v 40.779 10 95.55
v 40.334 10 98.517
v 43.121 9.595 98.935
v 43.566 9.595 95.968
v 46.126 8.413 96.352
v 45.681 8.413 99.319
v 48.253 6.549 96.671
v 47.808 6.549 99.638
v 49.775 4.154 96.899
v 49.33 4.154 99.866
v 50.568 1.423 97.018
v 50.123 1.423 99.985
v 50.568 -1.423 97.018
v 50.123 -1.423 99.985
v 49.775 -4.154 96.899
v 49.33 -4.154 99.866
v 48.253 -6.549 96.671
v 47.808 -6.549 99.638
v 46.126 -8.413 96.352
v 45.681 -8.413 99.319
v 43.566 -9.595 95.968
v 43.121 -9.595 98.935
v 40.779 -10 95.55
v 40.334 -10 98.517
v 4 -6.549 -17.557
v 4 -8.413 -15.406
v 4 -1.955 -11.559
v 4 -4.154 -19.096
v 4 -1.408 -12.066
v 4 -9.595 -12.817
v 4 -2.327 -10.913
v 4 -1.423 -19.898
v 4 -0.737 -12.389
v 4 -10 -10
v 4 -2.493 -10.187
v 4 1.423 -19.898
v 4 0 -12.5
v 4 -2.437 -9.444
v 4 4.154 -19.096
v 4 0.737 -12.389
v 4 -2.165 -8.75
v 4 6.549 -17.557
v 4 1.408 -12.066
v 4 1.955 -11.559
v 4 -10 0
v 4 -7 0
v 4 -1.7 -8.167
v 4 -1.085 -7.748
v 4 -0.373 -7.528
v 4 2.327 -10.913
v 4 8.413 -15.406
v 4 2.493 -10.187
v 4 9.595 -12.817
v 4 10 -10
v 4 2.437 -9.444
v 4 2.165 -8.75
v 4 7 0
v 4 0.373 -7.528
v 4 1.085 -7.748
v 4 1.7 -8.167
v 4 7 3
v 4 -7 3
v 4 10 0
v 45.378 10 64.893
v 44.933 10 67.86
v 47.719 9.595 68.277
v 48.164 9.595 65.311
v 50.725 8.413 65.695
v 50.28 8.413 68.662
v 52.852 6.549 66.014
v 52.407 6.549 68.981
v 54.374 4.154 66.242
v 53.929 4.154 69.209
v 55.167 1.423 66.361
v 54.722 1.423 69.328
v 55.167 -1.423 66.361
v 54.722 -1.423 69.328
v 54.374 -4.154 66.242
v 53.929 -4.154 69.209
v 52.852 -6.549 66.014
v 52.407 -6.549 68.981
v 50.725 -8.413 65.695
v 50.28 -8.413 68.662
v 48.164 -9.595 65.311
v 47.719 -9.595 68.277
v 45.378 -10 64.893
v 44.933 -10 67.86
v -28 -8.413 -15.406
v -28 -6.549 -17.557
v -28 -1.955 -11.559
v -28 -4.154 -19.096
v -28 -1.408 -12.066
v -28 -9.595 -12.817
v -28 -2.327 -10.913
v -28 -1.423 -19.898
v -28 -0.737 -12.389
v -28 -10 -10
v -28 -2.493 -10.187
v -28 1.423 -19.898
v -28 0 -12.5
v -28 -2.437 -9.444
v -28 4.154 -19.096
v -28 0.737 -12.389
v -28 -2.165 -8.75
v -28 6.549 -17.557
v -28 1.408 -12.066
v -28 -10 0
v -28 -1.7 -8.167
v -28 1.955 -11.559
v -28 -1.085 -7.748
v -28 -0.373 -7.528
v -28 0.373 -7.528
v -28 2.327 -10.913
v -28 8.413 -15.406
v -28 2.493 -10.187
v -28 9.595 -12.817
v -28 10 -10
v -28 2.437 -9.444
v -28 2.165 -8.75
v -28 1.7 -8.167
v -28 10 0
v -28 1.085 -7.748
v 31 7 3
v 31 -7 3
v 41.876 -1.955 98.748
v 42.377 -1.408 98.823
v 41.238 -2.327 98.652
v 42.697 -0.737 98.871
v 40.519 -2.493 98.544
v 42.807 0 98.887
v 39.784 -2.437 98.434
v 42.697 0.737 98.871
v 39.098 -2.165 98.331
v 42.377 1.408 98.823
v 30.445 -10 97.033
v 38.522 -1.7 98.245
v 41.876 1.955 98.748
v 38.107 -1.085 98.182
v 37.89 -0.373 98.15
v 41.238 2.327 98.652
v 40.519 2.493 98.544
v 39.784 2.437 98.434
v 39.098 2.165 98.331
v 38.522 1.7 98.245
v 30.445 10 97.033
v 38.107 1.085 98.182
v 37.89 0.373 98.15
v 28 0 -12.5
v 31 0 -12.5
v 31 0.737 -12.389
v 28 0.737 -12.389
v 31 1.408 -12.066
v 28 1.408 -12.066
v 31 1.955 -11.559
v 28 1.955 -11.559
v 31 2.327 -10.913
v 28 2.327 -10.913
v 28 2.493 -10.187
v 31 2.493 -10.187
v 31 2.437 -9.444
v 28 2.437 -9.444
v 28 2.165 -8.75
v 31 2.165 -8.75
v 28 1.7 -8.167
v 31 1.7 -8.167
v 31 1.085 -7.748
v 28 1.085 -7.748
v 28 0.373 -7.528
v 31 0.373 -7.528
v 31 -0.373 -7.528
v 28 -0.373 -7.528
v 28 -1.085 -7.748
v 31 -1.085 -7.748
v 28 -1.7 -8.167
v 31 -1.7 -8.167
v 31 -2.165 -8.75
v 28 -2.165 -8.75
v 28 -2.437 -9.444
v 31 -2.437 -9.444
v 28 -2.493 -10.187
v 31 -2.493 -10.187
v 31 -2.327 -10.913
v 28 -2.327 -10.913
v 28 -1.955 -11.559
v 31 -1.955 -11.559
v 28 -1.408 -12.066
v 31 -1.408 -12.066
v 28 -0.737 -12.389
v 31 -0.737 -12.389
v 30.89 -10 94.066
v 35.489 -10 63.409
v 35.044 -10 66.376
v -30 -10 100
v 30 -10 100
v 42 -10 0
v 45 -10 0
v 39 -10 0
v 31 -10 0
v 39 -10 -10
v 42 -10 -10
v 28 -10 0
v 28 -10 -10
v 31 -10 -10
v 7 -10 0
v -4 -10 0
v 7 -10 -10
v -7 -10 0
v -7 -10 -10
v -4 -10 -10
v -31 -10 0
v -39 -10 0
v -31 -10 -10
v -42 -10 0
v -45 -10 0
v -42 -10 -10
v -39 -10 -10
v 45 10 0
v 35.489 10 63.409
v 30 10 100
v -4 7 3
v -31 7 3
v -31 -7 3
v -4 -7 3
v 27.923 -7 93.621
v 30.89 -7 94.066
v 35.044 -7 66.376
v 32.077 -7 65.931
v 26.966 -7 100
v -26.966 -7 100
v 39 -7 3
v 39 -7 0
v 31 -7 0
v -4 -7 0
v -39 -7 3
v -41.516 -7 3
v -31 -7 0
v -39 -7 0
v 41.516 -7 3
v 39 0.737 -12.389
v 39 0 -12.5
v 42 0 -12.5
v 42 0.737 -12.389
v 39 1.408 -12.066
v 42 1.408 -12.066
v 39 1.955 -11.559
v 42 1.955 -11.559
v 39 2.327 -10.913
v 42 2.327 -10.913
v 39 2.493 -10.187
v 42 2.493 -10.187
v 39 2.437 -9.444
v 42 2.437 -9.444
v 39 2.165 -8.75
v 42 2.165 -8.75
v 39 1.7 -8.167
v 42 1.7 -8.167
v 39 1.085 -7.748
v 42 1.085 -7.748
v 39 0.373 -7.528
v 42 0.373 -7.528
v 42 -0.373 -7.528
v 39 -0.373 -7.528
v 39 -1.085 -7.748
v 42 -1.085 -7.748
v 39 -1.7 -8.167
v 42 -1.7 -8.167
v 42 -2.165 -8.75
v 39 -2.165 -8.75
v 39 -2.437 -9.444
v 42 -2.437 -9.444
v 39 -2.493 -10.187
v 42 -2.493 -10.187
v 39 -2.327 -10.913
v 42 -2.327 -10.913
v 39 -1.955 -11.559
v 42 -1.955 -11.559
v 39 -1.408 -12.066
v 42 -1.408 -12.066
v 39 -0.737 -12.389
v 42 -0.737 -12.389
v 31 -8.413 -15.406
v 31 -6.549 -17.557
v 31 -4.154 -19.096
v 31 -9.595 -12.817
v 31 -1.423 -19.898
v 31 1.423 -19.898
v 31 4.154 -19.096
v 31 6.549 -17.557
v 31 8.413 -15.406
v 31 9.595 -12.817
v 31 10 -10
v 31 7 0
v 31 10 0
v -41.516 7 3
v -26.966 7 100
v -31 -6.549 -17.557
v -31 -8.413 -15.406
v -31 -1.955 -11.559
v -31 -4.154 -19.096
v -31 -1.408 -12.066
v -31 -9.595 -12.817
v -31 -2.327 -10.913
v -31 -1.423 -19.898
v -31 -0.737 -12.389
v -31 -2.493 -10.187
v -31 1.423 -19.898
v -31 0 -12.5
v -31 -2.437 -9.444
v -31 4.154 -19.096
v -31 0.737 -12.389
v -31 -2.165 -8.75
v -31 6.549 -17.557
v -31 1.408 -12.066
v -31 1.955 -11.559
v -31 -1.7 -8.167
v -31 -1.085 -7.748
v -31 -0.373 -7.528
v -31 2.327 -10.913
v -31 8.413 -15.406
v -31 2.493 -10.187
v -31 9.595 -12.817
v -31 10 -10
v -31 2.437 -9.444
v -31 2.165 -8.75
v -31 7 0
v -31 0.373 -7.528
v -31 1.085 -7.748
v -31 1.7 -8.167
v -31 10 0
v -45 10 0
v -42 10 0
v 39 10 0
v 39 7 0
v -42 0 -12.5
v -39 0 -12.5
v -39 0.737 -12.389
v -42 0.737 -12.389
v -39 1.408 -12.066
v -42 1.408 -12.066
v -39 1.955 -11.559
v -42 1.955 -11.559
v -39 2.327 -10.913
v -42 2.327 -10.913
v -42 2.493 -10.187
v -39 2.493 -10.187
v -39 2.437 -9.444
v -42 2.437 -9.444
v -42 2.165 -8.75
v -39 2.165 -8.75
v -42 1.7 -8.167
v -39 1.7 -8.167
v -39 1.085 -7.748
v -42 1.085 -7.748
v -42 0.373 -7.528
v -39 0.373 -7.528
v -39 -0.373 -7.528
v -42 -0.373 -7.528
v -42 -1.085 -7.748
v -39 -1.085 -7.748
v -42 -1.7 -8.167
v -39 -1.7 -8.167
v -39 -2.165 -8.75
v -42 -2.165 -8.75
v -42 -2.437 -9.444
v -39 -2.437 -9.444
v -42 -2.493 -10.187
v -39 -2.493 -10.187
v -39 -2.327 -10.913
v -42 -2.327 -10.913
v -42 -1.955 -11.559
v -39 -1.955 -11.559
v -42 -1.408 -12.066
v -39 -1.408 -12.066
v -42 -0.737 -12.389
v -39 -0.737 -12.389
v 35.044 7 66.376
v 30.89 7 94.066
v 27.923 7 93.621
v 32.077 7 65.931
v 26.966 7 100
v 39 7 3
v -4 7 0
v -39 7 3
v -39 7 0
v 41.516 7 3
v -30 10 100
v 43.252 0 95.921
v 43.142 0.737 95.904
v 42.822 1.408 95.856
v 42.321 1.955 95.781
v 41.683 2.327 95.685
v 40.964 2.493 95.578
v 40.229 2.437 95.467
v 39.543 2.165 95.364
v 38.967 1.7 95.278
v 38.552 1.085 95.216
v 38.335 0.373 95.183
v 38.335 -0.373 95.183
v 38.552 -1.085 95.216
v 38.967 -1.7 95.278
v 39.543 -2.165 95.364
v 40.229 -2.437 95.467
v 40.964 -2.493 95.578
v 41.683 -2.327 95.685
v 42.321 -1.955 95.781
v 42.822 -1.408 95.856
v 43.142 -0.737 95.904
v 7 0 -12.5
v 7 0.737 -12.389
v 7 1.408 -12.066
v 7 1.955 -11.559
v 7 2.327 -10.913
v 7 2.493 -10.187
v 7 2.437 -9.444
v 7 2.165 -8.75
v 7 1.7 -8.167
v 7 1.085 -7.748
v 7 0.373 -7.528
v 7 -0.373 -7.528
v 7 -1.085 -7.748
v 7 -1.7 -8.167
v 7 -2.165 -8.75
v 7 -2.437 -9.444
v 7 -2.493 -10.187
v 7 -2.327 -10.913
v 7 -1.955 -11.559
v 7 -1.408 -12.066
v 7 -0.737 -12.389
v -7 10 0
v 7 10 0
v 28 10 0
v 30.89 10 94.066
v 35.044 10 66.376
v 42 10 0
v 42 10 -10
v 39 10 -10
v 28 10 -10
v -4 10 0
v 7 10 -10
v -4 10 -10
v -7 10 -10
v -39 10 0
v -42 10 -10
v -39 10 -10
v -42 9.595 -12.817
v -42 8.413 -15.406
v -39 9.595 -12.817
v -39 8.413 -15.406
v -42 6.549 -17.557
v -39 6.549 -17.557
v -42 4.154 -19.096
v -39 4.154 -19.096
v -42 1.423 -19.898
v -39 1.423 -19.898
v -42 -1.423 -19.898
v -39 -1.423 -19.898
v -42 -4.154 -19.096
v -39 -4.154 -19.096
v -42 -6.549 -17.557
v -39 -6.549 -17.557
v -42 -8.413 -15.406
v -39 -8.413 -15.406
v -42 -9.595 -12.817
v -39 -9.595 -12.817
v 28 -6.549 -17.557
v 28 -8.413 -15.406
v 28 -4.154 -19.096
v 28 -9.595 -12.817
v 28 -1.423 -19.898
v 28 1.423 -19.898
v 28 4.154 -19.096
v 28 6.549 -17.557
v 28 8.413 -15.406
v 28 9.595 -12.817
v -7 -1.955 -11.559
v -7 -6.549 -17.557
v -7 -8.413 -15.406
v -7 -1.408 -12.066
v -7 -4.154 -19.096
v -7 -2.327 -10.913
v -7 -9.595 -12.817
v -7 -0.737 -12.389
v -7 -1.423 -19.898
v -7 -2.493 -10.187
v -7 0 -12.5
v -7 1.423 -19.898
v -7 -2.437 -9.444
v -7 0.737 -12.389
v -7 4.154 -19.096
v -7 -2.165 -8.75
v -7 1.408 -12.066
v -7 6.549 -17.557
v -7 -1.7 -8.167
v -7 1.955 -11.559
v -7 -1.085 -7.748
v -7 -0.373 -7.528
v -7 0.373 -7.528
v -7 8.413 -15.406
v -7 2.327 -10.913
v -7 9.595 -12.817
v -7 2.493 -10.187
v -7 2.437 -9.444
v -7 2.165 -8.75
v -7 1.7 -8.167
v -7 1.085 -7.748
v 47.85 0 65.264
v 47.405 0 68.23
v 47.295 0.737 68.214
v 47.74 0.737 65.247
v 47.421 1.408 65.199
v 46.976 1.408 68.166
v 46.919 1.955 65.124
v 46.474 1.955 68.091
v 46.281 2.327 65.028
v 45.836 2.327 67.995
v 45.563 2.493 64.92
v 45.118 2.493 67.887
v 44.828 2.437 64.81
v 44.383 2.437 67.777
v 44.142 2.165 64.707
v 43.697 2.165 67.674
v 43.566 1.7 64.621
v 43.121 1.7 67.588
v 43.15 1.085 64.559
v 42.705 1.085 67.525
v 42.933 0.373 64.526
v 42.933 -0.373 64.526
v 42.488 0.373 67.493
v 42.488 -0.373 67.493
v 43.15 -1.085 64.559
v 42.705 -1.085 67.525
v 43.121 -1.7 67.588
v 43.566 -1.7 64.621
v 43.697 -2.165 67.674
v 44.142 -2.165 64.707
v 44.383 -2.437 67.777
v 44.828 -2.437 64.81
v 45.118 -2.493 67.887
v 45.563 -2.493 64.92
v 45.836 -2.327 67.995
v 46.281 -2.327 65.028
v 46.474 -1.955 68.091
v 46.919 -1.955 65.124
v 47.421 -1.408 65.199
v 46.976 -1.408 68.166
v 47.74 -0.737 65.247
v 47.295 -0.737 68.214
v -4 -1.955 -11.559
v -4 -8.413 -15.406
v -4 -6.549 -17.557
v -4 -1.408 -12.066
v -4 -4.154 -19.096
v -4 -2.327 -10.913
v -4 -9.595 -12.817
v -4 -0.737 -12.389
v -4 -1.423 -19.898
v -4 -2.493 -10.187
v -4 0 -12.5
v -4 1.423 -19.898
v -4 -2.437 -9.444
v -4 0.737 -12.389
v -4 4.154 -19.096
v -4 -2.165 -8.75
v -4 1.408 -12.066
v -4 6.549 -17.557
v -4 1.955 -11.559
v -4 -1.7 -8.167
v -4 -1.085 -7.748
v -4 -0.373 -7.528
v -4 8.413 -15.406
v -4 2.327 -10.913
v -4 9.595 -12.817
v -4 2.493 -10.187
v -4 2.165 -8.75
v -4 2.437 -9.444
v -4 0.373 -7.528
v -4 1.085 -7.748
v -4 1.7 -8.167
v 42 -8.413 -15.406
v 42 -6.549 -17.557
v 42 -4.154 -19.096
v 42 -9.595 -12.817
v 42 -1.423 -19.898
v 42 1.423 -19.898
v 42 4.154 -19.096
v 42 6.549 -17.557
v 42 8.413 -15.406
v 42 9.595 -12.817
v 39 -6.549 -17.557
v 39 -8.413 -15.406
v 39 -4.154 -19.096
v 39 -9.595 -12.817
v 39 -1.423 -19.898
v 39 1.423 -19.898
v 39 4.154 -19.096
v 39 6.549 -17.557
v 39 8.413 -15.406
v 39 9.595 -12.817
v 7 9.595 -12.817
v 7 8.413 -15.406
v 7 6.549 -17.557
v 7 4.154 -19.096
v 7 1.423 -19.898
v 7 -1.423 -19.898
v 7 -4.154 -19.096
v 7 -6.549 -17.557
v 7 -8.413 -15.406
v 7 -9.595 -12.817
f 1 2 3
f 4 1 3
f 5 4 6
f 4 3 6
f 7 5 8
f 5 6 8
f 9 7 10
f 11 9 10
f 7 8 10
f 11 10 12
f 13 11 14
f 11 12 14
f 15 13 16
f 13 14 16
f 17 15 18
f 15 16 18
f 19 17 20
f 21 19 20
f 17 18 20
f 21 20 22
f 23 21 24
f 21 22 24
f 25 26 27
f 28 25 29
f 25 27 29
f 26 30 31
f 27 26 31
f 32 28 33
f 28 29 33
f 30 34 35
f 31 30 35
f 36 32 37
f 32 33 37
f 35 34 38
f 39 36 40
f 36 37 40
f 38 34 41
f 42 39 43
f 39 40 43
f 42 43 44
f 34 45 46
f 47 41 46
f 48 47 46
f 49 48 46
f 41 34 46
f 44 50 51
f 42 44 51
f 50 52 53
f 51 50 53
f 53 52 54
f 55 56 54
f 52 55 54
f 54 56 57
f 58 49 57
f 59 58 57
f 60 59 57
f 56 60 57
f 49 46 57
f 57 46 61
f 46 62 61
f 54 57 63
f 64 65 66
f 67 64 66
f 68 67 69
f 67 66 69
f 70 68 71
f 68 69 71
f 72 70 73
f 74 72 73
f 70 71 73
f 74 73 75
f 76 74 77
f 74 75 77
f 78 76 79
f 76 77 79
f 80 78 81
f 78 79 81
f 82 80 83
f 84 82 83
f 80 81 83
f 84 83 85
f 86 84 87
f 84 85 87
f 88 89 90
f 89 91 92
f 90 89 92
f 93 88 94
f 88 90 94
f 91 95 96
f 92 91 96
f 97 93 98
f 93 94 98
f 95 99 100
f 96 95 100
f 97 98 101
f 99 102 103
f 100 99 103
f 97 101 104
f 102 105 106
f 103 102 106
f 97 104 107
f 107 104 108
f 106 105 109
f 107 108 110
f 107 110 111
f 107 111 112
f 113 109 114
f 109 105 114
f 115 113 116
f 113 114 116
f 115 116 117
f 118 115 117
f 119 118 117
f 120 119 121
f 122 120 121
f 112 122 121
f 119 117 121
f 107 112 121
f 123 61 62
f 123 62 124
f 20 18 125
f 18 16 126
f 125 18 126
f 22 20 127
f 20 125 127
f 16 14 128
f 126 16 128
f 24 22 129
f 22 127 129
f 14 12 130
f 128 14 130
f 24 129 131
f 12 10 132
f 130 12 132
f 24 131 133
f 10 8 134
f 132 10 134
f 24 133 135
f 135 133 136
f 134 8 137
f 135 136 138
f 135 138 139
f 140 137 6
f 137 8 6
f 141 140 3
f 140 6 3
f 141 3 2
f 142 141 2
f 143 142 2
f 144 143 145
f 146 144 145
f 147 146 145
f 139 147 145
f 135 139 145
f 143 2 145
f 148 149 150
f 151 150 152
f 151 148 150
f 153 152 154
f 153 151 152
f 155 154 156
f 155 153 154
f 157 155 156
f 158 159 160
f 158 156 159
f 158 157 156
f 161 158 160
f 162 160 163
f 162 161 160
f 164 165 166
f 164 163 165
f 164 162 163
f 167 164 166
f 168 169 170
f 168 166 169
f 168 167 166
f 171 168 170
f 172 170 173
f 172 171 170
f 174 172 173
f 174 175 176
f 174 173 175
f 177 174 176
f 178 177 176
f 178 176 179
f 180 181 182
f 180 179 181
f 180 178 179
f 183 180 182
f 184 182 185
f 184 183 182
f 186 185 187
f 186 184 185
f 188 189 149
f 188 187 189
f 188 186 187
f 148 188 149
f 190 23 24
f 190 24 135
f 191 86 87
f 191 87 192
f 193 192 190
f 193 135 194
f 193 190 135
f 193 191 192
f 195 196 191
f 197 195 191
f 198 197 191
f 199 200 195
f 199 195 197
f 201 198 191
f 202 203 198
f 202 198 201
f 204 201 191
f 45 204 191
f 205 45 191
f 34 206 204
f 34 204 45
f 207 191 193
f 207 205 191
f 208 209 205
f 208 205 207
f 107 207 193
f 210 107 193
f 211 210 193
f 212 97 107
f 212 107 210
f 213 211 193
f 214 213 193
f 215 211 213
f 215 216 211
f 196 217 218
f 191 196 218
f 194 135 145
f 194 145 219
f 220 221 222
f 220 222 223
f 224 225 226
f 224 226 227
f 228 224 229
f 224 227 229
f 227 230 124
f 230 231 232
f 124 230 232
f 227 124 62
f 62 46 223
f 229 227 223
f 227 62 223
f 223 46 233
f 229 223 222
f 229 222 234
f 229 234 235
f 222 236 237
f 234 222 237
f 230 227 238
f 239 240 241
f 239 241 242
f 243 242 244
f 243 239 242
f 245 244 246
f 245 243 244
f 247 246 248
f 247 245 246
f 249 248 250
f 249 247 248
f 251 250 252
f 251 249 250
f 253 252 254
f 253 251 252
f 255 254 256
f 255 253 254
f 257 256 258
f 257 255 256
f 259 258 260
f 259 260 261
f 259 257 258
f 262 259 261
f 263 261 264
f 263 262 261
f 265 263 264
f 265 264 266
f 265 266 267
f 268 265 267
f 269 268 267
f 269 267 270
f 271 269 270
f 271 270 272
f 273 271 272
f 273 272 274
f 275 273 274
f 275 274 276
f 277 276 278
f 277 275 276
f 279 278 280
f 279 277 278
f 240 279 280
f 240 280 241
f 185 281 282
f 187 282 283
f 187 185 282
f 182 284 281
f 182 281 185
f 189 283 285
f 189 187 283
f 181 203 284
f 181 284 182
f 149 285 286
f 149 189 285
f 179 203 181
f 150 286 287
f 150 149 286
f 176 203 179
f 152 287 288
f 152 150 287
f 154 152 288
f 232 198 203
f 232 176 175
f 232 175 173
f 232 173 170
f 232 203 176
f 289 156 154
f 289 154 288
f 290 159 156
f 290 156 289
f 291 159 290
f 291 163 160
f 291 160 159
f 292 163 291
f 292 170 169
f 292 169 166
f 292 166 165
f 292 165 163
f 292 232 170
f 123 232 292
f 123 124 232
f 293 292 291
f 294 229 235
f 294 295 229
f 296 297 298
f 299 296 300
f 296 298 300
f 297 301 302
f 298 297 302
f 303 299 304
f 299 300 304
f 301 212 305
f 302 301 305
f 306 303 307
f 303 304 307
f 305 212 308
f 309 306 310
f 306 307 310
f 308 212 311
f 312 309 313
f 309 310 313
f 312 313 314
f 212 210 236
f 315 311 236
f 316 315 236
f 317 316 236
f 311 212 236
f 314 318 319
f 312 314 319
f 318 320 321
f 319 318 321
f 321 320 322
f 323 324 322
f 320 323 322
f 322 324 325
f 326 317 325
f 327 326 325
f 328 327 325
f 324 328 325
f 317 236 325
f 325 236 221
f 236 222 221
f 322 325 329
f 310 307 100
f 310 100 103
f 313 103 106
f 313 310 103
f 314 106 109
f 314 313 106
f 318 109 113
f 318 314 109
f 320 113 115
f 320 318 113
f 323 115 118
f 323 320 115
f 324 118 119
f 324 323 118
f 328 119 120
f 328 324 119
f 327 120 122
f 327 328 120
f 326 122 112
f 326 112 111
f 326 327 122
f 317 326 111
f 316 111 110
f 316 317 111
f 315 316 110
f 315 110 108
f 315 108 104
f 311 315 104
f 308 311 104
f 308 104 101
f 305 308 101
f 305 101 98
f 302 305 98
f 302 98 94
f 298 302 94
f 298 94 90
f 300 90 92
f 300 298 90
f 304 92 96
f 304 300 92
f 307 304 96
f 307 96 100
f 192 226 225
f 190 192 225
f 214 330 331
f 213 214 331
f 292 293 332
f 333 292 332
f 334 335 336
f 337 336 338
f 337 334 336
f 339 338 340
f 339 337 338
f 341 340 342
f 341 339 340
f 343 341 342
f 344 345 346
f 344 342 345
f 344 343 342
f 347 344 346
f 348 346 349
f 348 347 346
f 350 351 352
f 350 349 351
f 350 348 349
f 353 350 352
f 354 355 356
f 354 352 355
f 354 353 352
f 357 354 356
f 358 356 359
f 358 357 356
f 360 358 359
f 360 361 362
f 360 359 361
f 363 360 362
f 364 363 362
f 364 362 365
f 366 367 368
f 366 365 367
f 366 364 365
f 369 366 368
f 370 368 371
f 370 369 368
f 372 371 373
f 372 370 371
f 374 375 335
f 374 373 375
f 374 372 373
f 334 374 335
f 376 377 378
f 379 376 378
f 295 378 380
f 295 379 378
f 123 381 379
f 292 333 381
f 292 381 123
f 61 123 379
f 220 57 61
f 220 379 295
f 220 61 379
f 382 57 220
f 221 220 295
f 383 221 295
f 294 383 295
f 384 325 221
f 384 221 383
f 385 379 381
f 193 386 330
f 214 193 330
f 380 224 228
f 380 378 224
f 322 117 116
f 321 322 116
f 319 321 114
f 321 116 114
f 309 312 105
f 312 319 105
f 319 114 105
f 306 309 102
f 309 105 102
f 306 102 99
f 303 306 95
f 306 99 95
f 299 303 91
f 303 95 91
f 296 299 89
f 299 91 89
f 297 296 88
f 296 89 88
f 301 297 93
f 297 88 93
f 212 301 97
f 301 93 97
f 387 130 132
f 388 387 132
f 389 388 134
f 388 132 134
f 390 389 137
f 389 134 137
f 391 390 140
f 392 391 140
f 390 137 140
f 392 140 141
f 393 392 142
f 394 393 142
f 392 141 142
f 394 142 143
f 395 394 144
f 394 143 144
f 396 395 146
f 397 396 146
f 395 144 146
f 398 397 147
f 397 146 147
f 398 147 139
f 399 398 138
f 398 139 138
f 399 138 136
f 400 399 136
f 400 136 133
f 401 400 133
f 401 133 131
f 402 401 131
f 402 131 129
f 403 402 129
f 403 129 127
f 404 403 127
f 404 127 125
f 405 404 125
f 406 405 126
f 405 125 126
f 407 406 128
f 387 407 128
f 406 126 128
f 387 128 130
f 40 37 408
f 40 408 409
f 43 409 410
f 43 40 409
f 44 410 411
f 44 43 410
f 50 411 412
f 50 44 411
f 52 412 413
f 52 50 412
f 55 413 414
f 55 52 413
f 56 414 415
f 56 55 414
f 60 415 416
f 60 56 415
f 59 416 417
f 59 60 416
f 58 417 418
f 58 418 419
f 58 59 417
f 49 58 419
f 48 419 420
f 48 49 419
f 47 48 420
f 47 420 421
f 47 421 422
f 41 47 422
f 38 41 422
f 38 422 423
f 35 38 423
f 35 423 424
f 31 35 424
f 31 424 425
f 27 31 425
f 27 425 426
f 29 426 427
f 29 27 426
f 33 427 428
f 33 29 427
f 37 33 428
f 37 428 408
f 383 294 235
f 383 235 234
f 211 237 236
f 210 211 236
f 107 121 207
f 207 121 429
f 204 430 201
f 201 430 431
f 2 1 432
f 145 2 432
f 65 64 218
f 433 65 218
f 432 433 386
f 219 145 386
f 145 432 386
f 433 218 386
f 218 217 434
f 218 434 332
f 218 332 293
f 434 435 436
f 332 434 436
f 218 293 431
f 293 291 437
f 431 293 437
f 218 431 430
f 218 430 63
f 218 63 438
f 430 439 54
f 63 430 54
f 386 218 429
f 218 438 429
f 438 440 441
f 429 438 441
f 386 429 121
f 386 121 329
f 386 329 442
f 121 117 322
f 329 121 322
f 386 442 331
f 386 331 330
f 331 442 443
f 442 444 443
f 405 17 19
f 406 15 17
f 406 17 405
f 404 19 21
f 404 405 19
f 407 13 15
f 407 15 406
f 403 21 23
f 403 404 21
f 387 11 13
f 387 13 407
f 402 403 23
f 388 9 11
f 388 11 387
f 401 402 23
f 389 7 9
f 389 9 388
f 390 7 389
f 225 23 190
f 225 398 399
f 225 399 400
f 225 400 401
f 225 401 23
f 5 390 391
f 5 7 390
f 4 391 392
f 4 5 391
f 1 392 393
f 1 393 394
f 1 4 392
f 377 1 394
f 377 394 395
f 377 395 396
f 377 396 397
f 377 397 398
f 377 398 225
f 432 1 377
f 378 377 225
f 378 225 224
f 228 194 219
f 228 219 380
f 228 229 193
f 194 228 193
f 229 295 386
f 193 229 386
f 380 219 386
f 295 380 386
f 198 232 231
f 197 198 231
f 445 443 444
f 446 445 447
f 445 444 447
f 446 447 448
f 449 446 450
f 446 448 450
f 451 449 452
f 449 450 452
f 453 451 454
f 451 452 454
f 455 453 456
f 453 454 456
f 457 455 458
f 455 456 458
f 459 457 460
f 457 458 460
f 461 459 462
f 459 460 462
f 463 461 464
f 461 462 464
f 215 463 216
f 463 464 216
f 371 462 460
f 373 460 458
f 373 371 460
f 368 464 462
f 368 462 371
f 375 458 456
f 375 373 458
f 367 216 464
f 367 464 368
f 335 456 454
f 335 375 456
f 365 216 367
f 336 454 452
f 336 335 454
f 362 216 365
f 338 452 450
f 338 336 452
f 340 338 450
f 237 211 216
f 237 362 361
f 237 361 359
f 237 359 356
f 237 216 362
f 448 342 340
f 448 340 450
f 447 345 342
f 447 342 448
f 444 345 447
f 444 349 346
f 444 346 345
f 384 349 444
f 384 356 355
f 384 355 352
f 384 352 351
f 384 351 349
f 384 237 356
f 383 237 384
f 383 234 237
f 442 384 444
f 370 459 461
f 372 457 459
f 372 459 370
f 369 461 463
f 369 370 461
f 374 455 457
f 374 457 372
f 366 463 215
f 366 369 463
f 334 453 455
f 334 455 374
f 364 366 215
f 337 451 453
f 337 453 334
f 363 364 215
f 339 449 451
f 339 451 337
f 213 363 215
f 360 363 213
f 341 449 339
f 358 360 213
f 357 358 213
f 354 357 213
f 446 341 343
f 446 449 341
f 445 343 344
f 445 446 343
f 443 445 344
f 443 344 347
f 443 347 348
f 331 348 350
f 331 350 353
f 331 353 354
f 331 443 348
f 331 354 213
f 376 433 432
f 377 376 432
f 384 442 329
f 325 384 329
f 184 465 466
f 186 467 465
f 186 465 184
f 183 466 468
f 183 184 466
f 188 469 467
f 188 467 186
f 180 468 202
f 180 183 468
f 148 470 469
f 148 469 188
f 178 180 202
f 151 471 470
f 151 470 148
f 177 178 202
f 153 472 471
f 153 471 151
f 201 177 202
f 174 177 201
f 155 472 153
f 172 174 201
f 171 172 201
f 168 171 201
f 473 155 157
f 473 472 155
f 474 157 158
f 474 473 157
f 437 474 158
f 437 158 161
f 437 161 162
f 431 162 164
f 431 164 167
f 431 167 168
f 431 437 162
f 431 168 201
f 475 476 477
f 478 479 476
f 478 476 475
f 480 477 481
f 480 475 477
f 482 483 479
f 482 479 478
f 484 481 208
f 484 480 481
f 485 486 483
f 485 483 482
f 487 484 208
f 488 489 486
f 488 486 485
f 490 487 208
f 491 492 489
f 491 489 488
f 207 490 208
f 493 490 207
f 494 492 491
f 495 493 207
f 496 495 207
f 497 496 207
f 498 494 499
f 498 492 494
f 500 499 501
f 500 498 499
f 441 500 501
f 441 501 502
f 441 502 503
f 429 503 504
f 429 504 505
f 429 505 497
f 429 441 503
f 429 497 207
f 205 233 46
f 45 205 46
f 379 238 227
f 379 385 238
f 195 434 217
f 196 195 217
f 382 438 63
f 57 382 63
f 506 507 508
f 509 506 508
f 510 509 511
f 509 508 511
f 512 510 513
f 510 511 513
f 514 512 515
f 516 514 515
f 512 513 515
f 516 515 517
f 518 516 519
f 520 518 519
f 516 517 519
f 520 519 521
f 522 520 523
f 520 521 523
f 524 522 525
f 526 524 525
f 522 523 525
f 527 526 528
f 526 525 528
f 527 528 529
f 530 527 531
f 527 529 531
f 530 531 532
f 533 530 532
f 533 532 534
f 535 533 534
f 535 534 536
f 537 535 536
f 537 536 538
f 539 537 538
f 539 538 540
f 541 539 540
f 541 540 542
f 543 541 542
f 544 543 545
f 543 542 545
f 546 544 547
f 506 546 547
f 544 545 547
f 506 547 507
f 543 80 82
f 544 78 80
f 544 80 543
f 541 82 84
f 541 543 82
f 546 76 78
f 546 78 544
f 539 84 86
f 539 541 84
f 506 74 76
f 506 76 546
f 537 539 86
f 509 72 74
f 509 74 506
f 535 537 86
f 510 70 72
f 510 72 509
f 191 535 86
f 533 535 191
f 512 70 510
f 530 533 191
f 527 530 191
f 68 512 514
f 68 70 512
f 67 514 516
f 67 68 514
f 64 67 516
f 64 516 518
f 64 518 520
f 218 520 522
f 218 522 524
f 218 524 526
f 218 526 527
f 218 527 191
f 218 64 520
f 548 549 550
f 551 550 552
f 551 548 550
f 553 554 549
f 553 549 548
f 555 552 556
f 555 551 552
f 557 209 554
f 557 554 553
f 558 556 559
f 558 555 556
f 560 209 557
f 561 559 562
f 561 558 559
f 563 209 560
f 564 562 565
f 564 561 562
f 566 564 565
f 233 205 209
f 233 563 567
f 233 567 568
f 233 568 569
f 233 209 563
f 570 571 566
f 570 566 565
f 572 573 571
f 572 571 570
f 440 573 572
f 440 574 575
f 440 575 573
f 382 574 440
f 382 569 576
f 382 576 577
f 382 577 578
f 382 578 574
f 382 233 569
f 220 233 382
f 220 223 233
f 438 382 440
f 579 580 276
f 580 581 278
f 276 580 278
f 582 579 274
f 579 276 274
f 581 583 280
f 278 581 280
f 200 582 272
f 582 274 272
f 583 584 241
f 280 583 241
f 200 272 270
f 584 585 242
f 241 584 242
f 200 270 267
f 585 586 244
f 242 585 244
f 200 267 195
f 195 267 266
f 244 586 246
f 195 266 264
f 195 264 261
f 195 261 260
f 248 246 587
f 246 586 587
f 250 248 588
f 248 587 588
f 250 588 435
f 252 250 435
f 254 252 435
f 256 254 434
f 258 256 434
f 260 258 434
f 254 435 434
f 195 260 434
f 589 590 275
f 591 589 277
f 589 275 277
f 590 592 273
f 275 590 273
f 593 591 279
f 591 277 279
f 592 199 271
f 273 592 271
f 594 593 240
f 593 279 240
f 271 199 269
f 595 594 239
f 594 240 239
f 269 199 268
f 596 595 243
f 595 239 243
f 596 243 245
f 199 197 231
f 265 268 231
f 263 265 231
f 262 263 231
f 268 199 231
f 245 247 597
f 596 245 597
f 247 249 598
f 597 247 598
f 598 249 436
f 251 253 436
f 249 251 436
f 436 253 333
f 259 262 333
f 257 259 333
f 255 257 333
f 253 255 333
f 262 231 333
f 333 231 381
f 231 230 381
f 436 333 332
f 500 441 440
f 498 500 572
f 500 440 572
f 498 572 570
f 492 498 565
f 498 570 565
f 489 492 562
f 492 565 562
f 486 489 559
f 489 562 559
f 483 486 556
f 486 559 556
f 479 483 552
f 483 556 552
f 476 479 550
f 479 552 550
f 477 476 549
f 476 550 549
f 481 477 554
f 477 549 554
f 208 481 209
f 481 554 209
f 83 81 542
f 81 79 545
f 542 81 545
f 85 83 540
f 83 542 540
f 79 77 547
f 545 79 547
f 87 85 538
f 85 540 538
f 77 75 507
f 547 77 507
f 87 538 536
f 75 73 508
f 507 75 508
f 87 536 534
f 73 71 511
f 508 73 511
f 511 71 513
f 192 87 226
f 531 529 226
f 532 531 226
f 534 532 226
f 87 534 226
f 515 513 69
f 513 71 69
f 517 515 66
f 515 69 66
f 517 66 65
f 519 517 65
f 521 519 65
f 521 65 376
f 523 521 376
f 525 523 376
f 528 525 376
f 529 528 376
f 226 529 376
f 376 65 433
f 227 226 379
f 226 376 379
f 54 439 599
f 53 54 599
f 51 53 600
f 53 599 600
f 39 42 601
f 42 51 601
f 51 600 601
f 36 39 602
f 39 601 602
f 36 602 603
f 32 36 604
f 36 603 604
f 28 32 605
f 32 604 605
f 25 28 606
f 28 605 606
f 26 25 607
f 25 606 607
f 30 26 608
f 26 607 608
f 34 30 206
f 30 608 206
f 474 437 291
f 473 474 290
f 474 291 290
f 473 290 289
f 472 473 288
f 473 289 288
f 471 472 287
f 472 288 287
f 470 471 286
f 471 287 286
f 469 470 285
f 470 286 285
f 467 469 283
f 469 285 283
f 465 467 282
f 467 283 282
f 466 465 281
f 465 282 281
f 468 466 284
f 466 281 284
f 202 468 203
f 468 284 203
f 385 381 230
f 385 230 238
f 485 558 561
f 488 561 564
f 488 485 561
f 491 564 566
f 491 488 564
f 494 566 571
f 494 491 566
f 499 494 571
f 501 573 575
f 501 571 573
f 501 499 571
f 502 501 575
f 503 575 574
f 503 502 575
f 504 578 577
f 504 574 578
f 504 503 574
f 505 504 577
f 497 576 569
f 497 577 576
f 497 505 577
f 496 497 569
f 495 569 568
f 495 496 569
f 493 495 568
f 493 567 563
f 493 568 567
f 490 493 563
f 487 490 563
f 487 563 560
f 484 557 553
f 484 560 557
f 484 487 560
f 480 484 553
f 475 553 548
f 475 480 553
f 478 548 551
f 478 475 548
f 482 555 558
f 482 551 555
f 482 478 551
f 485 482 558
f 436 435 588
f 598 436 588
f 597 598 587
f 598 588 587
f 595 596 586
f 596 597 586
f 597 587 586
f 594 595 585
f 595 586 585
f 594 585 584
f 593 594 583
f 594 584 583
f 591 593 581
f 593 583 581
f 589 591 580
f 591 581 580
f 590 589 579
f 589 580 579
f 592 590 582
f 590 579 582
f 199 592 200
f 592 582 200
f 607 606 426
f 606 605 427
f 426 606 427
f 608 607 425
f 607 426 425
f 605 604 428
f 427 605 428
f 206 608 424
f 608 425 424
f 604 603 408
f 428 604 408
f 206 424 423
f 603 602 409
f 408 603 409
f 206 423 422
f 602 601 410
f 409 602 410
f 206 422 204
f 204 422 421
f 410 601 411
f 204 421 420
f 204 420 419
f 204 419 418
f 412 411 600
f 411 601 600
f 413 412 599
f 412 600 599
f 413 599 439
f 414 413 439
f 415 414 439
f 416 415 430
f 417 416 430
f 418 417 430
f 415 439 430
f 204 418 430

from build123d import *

# Parameters (mm, degrees)
BOSS_EXTRUDE1_DEPTH = 10
BOSS_EXTRUDE2_START = 35
SKETCH2_R           = 2.5
BOSS_EXTRUDE2_DEPTH = 7
LPATTERN1_COUNT     = 3
LPATTERN1_PITCH     = 35
SHELL1_T            = -3
SKETCH3_W           = 8
SKETCH3_H           = 20
CUT_EXTRUDE1_DEPTH  = 20
BOSS_EXTRUDE3_START = -3
SKETCH5_R           = 2.5
BOSS_EXTRUDE3_DEPTH = 3
LPATTERN2_COUNT     = 2
LPATTERN2_PITCH     = 31
SKETCH6_W           = 28
SKETCH6_H           = 14
CUT_EXTRUDE2_DEPTH  = 3


with BuildPart() as part:
    # Sketch1 → Boss-Extrude1 (new body, symmetric)
    with BuildSketch(Plane(origin=(0, 0, 0), x_dir=(1, 0, 0), z_dir=(0, 1, 0))):
        Polygon((-45, 0), (45, 0), (30, -100), (-30, -100), align=None)
    extrude(amount=BOSS_EXTRUDE1_DEPTH, both=True)

    # Sketch2 → Boss-Extrude2 (add, symmetric)
    with BuildSketch(Plane(origin=(0, 0, 0), x_dir=(0, 0, -1), z_dir=(1, 0, 0)).offset(BOSS_EXTRUDE2_START)):
        with BuildLine():
            Line((0, 10), (10, 10))
            ThreePointArc((10, 10), (20, 0), (10, -10))
            Line((10, -10), (0, -10))
            Line((0, -10), (0, 10))
        make_face()
        with Locations((10, 0)):
            Circle(SKETCH2_R, mode=Mode.SUBTRACT)
    boss_extrude2 = extrude(amount=BOSS_EXTRUDE2_DEPTH, both=True)

    # LPattern1: Boss-Extrude2 ×3
    with Locations(*[(-i * LPATTERN1_PITCH, 0, 0) for i in range(1, LPATTERN1_COUNT)]):
        add(boss_extrude2)

    # Shell1
    shell1_openings = [part.faces().sort_by_distance(p)[0] for p in [
        (0, 0, 100),
    ]]
    offset(amount=SHELL1_T, openings=shell1_openings, kind=Kind.INTERSECTION)

    # Sketch3 → Cut-Extrude1 (cut)
    with BuildSketch(Plane.XY):
        with Locations((35, 0)):
            Rectangle(SKETCH3_W, SKETCH3_H)
        Rectangle(SKETCH3_W, SKETCH3_H)
        with Locations((-35, 0)):
            Rectangle(SKETCH3_W, SKETCH3_H)
    extrude(amount=-CUT_EXTRUDE1_DEPTH, mode=Mode.SUBTRACT)

    # Sketch5 → Boss-Extrude3 (add)
    with BuildSketch(Plane(origin=(-14.009779951, 0, 93.398533007), x_dir=(0.988936353, 0, 0.148340453), z_dir=(-0.148340453, 0, 0.988936353)).offset(BOSS_EXTRUDE3_START)):
        with BuildLine():
            Line((44.502135879, 10), (54.502135879, 10))
            ThreePointArc((54.502135879, 10), (64.502135879, 0), (54.502135879, -10))
            Line((54.502135879, -10), (44.502135879, -10))
            Line((44.502135879, -10), (44.502135879, 10))
        make_face()
        with Locations((54.502135879, 0)):
            Circle(SKETCH5_R, mode=Mode.SUBTRACT)
    boss_extrude3 = extrude(amount=-BOSS_EXTRUDE3_DEPTH)

    # LPattern2: Boss-Extrude3 ×2
    with Locations(*[Vector(0.148340453, 0, -0.988936353) * (i * LPATTERN2_PITCH) for i in range(1, LPATTERN2_COUNT)]):
        add(boss_extrude3)

    # Sketch6 → Cut-Extrude2 (cut)
    with BuildSketch(Plane(origin=(44.009779951, 0, 6.601466993), x_dir=(0.148340453, 0, -0.988936353), z_dir=(0.988936353, 0, 0.148340453))):
        with Locations((-74.443421699, 0)):
            Rectangle(SKETCH6_W, SKETCH6_H)
    extrude(amount=-CUT_EXTRUDE2_DEPTH, mode=Mode.SUBTRACT)


solid = part.part
